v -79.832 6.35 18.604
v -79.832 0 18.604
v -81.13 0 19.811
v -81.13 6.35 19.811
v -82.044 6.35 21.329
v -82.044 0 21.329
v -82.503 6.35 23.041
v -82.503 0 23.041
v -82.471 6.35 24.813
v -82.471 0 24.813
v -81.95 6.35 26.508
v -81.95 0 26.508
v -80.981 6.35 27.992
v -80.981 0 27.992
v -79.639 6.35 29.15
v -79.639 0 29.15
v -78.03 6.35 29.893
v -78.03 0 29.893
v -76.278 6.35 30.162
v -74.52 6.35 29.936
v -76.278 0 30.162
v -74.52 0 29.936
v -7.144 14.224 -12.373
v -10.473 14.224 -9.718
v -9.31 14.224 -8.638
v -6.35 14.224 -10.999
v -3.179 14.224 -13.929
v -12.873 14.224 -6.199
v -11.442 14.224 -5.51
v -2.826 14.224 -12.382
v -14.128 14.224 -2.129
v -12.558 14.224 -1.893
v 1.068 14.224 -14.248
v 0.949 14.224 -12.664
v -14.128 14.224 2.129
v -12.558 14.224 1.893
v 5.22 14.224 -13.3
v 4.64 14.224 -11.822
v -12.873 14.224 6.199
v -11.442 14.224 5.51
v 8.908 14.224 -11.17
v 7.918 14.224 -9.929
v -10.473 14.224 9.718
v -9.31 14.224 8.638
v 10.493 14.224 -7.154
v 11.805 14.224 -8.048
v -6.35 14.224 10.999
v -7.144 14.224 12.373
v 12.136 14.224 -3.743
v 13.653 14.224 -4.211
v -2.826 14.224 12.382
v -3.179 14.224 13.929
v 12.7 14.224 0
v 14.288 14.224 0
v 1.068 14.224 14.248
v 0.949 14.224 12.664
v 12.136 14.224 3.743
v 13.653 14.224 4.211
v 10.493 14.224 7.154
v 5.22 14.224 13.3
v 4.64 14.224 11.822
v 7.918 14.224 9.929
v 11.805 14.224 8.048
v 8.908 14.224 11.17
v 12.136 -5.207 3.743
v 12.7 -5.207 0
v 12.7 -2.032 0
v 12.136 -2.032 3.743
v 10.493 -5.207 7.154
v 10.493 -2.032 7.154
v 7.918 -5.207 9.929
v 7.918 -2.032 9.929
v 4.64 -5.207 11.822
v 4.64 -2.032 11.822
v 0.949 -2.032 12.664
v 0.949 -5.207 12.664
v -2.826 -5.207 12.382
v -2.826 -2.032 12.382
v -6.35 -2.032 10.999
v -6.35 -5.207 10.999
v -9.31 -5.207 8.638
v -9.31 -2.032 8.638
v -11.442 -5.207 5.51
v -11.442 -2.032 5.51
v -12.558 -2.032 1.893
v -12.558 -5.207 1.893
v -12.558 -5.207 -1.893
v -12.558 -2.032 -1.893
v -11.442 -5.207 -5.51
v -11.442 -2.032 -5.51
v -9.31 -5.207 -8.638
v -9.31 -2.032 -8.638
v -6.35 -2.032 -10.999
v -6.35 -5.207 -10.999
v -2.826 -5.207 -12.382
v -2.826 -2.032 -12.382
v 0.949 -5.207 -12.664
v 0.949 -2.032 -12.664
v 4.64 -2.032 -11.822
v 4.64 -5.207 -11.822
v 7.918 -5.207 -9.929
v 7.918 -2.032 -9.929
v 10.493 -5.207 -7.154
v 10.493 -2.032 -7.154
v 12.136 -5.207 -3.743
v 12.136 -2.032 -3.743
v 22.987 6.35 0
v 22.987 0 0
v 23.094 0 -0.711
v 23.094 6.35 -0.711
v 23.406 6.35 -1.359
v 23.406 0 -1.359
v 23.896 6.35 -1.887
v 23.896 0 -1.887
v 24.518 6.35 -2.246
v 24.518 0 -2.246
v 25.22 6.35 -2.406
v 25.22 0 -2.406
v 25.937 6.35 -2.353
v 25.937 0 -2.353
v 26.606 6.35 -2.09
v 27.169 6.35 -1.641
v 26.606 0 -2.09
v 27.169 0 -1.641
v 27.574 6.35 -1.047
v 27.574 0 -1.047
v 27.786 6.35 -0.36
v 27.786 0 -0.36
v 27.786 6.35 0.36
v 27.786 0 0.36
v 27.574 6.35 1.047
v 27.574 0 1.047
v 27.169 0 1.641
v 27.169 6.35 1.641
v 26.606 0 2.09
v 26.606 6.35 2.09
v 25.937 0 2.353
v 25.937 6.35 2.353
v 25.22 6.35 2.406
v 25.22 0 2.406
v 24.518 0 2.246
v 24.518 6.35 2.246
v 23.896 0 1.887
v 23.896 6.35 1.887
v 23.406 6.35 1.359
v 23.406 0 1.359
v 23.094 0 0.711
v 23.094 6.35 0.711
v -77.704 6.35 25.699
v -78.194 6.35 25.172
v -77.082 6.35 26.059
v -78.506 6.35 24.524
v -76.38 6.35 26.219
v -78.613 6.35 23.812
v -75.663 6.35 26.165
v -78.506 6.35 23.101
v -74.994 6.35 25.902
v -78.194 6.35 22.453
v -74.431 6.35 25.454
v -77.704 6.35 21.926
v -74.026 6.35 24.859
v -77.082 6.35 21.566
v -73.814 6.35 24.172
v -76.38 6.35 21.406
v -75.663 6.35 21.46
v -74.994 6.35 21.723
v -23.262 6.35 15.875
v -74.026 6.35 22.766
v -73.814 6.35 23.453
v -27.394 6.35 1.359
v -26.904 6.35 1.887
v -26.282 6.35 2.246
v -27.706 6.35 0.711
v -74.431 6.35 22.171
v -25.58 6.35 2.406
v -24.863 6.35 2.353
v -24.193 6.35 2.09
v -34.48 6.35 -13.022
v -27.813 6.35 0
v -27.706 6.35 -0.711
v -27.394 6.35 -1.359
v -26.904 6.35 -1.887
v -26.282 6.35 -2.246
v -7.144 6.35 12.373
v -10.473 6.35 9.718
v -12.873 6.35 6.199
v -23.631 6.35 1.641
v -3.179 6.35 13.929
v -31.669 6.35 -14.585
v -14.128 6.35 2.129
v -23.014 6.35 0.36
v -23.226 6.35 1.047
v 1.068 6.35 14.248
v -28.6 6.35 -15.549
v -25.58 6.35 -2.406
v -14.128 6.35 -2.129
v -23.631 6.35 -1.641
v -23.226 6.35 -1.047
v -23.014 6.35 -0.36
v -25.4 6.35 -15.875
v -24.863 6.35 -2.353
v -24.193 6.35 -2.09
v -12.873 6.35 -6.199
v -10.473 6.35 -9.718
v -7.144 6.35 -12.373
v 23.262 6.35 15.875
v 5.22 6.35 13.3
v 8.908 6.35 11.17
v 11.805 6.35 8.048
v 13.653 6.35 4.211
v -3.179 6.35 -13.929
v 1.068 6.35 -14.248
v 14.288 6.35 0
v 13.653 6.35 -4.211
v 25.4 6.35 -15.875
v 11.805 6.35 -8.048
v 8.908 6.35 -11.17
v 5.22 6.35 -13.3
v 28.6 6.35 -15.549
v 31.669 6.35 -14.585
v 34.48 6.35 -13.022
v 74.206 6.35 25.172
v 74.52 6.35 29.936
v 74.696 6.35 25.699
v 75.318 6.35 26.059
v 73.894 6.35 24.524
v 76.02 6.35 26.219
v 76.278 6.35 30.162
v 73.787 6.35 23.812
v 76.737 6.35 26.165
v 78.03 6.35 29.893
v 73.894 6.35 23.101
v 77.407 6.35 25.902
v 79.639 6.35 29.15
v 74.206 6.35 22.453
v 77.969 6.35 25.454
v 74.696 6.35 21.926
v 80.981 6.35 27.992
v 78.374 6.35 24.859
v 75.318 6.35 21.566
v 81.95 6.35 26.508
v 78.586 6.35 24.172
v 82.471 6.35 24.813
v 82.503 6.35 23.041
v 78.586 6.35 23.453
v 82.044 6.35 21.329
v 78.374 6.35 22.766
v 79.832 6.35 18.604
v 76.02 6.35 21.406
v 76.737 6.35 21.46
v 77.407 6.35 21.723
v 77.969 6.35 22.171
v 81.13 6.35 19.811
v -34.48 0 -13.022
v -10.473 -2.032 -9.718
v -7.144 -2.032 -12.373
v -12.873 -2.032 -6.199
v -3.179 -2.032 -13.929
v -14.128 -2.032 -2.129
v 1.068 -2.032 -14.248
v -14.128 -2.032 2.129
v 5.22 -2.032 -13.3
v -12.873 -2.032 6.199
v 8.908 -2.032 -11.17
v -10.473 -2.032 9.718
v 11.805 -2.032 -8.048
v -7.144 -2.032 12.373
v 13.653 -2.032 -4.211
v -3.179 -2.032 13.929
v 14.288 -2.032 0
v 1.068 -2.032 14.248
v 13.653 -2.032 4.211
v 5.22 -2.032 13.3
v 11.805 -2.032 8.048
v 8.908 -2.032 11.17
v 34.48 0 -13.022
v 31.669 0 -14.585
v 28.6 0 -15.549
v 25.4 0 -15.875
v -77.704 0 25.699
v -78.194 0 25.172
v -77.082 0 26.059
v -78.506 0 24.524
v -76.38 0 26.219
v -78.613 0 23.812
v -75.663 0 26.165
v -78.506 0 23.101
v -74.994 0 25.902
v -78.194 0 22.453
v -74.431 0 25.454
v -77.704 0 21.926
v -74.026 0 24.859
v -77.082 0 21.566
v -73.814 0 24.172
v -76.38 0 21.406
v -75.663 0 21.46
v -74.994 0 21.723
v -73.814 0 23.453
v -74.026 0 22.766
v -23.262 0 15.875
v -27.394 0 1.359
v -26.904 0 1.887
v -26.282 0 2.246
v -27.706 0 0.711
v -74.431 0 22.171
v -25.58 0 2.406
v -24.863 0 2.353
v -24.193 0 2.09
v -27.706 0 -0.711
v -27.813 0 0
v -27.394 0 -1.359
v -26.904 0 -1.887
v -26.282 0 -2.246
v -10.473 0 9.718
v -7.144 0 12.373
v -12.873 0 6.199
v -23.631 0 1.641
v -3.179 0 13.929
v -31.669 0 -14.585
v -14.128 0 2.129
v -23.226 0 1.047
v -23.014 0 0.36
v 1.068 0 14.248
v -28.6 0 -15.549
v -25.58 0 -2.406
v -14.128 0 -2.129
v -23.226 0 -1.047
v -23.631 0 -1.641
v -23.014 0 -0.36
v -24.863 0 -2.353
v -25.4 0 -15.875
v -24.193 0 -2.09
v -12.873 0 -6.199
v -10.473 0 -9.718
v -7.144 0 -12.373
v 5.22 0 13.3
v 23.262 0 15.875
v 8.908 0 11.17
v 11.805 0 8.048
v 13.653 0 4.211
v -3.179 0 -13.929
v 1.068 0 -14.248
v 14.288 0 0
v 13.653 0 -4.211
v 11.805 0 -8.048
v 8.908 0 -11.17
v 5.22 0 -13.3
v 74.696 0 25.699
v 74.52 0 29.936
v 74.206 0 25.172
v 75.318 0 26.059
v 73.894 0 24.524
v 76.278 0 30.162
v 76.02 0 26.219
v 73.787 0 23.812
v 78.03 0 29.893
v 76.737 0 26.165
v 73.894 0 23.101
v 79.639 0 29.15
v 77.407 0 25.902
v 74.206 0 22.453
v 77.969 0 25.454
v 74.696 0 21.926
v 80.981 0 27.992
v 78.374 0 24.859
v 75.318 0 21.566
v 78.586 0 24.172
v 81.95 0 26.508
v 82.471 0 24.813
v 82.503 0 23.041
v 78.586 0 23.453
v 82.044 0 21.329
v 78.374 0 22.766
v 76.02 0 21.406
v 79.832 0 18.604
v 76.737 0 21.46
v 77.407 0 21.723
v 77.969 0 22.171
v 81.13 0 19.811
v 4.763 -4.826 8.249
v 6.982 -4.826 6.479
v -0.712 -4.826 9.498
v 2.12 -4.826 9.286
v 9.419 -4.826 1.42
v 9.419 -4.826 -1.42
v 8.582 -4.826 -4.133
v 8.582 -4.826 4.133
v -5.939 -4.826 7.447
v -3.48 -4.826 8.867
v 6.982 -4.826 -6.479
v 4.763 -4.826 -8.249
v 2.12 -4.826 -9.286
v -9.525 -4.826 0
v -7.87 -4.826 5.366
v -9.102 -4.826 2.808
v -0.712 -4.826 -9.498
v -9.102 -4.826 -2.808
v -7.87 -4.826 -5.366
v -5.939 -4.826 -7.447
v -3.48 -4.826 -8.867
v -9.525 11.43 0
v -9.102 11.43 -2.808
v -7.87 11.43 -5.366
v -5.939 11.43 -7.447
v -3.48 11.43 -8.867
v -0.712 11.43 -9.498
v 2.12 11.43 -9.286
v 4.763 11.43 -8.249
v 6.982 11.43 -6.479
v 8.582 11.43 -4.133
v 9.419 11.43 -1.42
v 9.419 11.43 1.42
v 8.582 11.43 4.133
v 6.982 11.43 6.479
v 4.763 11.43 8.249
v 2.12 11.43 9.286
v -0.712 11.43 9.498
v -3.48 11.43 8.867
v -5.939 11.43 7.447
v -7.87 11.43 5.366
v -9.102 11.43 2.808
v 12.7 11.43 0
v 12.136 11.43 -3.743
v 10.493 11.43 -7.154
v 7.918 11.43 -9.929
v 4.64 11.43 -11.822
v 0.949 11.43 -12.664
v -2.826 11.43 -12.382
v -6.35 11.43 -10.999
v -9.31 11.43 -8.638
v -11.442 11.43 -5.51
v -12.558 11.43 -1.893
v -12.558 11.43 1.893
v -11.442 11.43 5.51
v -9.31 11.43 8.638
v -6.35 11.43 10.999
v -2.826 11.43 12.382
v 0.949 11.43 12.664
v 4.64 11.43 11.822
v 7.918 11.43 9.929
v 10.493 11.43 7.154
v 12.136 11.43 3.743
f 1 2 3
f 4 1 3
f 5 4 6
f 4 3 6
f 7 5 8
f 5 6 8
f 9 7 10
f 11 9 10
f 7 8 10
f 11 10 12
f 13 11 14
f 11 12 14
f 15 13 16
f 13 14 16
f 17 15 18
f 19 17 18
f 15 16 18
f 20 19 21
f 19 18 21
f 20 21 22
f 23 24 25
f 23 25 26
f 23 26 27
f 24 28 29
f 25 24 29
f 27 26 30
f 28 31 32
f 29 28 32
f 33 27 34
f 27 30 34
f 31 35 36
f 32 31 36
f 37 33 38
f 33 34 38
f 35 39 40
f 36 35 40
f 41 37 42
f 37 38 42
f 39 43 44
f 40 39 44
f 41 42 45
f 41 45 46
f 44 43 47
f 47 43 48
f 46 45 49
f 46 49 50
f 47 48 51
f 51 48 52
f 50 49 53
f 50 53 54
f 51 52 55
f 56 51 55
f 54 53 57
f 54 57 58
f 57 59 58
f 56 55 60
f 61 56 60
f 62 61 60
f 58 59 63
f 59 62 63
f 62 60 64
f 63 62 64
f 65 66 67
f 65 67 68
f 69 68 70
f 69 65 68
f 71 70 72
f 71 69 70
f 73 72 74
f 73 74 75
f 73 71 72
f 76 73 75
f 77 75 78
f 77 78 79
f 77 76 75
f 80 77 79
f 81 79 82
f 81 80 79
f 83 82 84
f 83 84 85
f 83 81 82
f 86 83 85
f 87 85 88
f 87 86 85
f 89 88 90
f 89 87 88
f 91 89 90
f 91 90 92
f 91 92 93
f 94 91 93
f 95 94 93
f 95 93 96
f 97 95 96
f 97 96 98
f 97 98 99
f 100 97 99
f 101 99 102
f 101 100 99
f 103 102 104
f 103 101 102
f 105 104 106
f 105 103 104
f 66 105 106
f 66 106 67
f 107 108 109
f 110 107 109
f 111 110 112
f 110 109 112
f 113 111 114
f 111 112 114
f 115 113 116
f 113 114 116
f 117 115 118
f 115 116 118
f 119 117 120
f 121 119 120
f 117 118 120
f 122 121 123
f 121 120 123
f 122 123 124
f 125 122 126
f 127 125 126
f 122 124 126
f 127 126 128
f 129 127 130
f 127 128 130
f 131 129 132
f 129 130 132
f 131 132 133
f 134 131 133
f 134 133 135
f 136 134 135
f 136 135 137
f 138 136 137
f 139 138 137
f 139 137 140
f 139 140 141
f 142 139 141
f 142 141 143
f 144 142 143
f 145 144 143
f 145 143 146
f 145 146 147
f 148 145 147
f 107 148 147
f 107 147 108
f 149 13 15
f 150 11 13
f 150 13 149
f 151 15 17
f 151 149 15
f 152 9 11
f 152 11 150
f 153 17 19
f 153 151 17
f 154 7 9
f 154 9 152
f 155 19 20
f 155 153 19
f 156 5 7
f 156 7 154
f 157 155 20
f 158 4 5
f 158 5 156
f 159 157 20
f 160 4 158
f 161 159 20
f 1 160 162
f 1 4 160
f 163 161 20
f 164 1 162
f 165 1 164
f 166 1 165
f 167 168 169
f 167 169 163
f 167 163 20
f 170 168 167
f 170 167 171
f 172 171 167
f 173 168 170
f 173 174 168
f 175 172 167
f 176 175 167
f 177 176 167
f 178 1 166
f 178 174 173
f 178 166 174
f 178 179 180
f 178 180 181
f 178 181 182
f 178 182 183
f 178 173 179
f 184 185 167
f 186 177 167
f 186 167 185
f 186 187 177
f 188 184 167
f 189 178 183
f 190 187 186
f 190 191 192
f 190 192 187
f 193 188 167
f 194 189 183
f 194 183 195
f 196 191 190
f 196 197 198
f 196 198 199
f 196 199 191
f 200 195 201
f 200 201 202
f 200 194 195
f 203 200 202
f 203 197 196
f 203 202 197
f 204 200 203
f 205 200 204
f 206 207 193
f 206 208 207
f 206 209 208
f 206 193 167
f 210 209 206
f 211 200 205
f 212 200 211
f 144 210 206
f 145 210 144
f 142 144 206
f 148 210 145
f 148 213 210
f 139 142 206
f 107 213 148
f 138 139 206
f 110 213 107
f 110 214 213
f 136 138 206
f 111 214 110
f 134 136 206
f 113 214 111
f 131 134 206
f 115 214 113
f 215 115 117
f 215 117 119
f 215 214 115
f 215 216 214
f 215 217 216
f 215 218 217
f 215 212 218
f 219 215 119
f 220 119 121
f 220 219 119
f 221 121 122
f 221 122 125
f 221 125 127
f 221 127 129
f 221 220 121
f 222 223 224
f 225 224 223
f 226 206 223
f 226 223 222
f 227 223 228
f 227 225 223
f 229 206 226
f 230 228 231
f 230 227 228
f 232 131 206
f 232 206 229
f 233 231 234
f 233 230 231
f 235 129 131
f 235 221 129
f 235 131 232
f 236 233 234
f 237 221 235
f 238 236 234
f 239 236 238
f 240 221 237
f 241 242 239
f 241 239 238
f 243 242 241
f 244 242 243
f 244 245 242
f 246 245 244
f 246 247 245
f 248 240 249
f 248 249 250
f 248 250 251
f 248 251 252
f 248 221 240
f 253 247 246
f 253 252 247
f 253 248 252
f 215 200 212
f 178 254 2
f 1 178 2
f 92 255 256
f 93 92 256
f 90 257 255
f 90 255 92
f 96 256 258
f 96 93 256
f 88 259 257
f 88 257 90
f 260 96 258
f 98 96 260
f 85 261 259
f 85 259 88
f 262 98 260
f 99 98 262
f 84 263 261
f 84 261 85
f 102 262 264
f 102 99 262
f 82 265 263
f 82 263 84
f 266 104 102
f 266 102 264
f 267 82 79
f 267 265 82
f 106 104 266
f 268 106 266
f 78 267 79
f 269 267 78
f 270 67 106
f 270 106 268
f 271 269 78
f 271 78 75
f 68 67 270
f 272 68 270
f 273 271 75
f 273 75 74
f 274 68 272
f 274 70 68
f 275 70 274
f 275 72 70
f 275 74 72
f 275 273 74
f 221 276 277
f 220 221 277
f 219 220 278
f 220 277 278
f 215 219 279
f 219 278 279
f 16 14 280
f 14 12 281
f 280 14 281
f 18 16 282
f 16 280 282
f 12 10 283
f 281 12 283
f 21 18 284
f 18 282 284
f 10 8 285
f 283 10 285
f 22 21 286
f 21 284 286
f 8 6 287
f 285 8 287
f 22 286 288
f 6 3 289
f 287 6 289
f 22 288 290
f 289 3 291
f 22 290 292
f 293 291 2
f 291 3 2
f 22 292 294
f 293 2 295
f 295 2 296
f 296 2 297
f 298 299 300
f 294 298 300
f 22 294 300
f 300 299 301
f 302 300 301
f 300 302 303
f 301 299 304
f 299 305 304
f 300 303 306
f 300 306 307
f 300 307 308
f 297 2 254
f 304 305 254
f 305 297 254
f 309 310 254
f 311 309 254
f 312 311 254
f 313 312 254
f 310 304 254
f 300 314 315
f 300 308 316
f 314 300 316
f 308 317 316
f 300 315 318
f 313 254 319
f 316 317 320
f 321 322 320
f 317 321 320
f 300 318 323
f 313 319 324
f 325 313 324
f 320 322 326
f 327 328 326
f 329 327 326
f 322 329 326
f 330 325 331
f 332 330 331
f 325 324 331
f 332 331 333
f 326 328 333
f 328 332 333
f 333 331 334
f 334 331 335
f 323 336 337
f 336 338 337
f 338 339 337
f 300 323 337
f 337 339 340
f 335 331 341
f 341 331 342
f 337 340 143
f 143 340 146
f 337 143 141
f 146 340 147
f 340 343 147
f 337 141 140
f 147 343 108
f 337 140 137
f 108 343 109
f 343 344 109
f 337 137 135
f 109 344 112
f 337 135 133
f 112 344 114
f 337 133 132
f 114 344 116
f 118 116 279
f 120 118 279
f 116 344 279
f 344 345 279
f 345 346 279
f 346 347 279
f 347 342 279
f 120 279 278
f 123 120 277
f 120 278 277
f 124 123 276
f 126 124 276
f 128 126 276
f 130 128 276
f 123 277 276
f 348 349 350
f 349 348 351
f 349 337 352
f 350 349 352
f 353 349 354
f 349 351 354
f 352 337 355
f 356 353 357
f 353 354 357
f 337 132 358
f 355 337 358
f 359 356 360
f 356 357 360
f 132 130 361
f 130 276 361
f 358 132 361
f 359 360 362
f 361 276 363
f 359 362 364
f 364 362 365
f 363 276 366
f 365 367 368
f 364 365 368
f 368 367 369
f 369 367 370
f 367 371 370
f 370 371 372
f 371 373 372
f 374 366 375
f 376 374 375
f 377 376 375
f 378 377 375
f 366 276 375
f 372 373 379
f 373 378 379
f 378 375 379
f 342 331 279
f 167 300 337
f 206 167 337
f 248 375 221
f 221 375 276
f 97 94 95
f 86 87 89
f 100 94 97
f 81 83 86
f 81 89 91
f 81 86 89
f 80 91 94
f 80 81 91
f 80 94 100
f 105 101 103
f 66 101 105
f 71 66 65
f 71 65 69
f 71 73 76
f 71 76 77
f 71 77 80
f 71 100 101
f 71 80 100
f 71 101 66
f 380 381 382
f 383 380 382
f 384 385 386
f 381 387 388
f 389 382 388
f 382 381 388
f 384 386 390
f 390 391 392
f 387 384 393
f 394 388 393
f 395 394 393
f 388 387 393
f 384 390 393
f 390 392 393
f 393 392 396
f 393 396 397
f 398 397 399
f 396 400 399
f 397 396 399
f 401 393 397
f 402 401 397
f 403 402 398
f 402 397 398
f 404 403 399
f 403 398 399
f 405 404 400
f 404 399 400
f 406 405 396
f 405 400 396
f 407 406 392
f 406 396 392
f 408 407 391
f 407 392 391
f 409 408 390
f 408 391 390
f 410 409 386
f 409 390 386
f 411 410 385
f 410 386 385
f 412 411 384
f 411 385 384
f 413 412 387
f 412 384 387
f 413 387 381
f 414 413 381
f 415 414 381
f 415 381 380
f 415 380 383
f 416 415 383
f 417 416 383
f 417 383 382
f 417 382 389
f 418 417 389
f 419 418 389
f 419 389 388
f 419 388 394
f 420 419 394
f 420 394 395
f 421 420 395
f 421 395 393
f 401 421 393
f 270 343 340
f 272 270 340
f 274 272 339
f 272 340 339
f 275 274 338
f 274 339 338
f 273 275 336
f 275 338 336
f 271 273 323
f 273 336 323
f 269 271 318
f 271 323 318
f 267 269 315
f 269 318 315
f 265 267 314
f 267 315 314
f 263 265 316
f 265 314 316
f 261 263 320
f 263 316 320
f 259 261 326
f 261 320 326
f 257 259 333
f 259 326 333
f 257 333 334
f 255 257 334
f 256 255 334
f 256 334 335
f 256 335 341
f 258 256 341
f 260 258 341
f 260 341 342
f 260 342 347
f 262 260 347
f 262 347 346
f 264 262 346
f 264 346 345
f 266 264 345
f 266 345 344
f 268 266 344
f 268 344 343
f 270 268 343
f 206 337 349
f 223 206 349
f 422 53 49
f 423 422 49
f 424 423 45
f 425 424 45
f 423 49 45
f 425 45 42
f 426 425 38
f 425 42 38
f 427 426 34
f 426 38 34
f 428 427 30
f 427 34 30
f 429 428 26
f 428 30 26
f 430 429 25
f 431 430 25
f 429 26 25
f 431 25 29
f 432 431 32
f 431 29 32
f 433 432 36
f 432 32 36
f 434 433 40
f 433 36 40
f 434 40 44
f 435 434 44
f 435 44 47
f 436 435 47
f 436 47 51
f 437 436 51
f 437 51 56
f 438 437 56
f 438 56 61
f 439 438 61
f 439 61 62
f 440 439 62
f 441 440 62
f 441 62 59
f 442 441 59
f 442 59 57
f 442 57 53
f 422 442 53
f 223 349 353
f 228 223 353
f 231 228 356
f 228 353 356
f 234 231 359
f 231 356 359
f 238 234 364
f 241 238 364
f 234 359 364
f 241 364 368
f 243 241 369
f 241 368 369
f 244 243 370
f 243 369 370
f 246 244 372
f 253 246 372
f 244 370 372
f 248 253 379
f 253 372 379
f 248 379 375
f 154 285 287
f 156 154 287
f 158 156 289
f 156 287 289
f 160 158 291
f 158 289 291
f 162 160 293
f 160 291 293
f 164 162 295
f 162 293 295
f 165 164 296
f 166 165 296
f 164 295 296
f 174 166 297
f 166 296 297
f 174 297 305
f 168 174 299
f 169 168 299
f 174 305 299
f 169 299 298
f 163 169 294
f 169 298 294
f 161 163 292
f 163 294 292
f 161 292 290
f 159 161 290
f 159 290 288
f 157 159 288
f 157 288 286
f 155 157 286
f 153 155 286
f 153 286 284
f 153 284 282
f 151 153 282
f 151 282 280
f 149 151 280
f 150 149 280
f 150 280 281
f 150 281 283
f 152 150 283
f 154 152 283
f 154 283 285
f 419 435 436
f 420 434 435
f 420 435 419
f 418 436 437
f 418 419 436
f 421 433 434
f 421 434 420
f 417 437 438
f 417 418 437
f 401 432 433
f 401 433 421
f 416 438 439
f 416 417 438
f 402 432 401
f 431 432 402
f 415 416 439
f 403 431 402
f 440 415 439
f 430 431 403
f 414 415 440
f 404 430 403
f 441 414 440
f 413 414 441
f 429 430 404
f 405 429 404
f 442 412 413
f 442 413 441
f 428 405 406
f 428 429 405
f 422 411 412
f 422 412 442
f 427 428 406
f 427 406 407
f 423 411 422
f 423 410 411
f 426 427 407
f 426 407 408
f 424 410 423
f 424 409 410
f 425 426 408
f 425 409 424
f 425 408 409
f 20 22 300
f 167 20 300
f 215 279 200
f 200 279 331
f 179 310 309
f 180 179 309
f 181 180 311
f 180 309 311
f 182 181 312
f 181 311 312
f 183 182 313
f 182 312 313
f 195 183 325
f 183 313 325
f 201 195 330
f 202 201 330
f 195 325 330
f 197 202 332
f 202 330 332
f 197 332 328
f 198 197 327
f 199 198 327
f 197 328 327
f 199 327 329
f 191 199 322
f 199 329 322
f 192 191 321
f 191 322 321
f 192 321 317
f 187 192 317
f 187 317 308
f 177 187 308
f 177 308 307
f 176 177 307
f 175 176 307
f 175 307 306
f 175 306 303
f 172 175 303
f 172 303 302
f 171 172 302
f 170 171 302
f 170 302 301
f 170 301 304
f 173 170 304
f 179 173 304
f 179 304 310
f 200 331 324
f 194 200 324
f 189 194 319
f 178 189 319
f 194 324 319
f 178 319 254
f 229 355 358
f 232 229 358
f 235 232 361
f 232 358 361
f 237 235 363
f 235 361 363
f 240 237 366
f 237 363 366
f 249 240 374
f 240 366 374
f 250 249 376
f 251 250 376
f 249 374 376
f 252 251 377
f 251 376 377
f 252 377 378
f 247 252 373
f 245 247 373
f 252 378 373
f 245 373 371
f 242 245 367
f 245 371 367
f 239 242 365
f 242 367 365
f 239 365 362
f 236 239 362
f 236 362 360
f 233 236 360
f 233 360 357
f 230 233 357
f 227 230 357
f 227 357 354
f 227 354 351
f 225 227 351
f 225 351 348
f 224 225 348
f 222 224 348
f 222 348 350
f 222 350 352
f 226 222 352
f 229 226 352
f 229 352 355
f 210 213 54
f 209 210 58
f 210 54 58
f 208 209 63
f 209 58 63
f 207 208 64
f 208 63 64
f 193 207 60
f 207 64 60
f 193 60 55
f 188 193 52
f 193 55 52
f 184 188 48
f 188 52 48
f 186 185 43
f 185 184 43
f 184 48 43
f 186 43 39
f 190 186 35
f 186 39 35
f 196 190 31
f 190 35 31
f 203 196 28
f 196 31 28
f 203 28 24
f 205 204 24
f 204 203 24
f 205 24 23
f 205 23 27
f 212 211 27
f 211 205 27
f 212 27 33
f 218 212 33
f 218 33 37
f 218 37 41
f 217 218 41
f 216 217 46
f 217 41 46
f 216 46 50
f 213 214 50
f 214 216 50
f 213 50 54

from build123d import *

# Parameters (mm, degrees)
BOSS_EXTRUDE1_DEPTH    = 6.35
BOSS_EXTRUDE2_START    = -14.224
SKETCH2_R              = 14.2875
BOSS_EXTRUDE2_DEPTH    = 19.431
HOLE1_D                = 19.05
HOLE1_DEPTH            = 19.05
HOLE1_CBORE_D          = 25.4
HOLE1_CBORE_DEPTH      = 2.794
F_10_32_TAPPED_HOLE1_D = 4.826
SKETCH7_R              = 14.2875
SKETCH7_R_2            = 12.7
CUT_EXTRUDE1_DEPTH     = 3.175


with BuildPart() as part:
    # Sketch1 → Boss-Extrude1 (new body)
    with BuildSketch(Plane(origin=(0, 0, 0), x_dir=(1, 0, 0), z_dir=(0, 1, 0))):
        with BuildLine():
            Line((79.832170731, -18.603869107), (34.480426828, 13.021577233))
            ThreePointArc((34.480426828, 13.021577233), (30.159101093, 15.14485331), (25.4, 15.875))
            Line((25.4, 15.875), (-25.4, 15.875))
            ThreePointArc((-25.4, 15.875), (-30.159101093, 15.14485331), (-34.480426828, 13.021577233))
            Line((-34.480426828, 13.021577233), (-79.832170731, -18.603869107))
            ThreePointArc((-79.832170731, -18.603869107), (-81.949664243, -26.507655114), (-74.520111094, -29.936262999))
            Line((-74.520111094, -29.936262999), (-23.262053626, -15.875))
            Line((-23.262053626, -15.875), (23.262053626, -15.875))
            Line((23.262053626, -15.875), (74.520111094, -29.936262999))
            ThreePointArc((74.520111094, -29.936262999), (81.949664243, -26.507655114), (79.832170731, -18.603869107))
        make_face()
    extrude(amount=BOSS_EXTRUDE1_DEPTH)

    # Sketch2 → Boss-Extrude2 (add)
    with BuildSketch(Plane.XZ.offset(BOSS_EXTRUDE2_START)):
        Circle(SKETCH2_R)
    extrude(amount=BOSS_EXTRUDE2_DEPTH)

    # Hole1
    with Locations(Plane(origin=(0, 14.224, 0), x_dir=(1, 0, 0), z_dir=(0, 1, 0))):
        with Locations((0, 0)):
            CounterBoreHole(HOLE1_D / 2, HOLE1_CBORE_D / 2, HOLE1_CBORE_DEPTH, depth=HOLE1_DEPTH)

    # #10-32 Tapped Hole1 (through all)
    with Locations(Plane(origin=(0, 6.35, 0), x_dir=(1, 0, 0), z_dir=(0, 1, 0))):
        with Locations((-25.4, 0), (25.4, 0), (-76.2, -23.8125), (76.2, -23.8125)):
            Hole(F_10_32_TAPPED_HOLE1_D / 2)

    # Sketch7 → Cut-Extrude1 (cut)
    with BuildSketch(Plane.XZ.offset(5.207)):
        Circle(SKETCH7_R)
        Circle(SKETCH7_R_2, mode=Mode.SUBTRACT)
    extrude(amount=-CUT_EXTRUDE1_DEPTH, mode=Mode.SUBTRACT)


solid = part.part
